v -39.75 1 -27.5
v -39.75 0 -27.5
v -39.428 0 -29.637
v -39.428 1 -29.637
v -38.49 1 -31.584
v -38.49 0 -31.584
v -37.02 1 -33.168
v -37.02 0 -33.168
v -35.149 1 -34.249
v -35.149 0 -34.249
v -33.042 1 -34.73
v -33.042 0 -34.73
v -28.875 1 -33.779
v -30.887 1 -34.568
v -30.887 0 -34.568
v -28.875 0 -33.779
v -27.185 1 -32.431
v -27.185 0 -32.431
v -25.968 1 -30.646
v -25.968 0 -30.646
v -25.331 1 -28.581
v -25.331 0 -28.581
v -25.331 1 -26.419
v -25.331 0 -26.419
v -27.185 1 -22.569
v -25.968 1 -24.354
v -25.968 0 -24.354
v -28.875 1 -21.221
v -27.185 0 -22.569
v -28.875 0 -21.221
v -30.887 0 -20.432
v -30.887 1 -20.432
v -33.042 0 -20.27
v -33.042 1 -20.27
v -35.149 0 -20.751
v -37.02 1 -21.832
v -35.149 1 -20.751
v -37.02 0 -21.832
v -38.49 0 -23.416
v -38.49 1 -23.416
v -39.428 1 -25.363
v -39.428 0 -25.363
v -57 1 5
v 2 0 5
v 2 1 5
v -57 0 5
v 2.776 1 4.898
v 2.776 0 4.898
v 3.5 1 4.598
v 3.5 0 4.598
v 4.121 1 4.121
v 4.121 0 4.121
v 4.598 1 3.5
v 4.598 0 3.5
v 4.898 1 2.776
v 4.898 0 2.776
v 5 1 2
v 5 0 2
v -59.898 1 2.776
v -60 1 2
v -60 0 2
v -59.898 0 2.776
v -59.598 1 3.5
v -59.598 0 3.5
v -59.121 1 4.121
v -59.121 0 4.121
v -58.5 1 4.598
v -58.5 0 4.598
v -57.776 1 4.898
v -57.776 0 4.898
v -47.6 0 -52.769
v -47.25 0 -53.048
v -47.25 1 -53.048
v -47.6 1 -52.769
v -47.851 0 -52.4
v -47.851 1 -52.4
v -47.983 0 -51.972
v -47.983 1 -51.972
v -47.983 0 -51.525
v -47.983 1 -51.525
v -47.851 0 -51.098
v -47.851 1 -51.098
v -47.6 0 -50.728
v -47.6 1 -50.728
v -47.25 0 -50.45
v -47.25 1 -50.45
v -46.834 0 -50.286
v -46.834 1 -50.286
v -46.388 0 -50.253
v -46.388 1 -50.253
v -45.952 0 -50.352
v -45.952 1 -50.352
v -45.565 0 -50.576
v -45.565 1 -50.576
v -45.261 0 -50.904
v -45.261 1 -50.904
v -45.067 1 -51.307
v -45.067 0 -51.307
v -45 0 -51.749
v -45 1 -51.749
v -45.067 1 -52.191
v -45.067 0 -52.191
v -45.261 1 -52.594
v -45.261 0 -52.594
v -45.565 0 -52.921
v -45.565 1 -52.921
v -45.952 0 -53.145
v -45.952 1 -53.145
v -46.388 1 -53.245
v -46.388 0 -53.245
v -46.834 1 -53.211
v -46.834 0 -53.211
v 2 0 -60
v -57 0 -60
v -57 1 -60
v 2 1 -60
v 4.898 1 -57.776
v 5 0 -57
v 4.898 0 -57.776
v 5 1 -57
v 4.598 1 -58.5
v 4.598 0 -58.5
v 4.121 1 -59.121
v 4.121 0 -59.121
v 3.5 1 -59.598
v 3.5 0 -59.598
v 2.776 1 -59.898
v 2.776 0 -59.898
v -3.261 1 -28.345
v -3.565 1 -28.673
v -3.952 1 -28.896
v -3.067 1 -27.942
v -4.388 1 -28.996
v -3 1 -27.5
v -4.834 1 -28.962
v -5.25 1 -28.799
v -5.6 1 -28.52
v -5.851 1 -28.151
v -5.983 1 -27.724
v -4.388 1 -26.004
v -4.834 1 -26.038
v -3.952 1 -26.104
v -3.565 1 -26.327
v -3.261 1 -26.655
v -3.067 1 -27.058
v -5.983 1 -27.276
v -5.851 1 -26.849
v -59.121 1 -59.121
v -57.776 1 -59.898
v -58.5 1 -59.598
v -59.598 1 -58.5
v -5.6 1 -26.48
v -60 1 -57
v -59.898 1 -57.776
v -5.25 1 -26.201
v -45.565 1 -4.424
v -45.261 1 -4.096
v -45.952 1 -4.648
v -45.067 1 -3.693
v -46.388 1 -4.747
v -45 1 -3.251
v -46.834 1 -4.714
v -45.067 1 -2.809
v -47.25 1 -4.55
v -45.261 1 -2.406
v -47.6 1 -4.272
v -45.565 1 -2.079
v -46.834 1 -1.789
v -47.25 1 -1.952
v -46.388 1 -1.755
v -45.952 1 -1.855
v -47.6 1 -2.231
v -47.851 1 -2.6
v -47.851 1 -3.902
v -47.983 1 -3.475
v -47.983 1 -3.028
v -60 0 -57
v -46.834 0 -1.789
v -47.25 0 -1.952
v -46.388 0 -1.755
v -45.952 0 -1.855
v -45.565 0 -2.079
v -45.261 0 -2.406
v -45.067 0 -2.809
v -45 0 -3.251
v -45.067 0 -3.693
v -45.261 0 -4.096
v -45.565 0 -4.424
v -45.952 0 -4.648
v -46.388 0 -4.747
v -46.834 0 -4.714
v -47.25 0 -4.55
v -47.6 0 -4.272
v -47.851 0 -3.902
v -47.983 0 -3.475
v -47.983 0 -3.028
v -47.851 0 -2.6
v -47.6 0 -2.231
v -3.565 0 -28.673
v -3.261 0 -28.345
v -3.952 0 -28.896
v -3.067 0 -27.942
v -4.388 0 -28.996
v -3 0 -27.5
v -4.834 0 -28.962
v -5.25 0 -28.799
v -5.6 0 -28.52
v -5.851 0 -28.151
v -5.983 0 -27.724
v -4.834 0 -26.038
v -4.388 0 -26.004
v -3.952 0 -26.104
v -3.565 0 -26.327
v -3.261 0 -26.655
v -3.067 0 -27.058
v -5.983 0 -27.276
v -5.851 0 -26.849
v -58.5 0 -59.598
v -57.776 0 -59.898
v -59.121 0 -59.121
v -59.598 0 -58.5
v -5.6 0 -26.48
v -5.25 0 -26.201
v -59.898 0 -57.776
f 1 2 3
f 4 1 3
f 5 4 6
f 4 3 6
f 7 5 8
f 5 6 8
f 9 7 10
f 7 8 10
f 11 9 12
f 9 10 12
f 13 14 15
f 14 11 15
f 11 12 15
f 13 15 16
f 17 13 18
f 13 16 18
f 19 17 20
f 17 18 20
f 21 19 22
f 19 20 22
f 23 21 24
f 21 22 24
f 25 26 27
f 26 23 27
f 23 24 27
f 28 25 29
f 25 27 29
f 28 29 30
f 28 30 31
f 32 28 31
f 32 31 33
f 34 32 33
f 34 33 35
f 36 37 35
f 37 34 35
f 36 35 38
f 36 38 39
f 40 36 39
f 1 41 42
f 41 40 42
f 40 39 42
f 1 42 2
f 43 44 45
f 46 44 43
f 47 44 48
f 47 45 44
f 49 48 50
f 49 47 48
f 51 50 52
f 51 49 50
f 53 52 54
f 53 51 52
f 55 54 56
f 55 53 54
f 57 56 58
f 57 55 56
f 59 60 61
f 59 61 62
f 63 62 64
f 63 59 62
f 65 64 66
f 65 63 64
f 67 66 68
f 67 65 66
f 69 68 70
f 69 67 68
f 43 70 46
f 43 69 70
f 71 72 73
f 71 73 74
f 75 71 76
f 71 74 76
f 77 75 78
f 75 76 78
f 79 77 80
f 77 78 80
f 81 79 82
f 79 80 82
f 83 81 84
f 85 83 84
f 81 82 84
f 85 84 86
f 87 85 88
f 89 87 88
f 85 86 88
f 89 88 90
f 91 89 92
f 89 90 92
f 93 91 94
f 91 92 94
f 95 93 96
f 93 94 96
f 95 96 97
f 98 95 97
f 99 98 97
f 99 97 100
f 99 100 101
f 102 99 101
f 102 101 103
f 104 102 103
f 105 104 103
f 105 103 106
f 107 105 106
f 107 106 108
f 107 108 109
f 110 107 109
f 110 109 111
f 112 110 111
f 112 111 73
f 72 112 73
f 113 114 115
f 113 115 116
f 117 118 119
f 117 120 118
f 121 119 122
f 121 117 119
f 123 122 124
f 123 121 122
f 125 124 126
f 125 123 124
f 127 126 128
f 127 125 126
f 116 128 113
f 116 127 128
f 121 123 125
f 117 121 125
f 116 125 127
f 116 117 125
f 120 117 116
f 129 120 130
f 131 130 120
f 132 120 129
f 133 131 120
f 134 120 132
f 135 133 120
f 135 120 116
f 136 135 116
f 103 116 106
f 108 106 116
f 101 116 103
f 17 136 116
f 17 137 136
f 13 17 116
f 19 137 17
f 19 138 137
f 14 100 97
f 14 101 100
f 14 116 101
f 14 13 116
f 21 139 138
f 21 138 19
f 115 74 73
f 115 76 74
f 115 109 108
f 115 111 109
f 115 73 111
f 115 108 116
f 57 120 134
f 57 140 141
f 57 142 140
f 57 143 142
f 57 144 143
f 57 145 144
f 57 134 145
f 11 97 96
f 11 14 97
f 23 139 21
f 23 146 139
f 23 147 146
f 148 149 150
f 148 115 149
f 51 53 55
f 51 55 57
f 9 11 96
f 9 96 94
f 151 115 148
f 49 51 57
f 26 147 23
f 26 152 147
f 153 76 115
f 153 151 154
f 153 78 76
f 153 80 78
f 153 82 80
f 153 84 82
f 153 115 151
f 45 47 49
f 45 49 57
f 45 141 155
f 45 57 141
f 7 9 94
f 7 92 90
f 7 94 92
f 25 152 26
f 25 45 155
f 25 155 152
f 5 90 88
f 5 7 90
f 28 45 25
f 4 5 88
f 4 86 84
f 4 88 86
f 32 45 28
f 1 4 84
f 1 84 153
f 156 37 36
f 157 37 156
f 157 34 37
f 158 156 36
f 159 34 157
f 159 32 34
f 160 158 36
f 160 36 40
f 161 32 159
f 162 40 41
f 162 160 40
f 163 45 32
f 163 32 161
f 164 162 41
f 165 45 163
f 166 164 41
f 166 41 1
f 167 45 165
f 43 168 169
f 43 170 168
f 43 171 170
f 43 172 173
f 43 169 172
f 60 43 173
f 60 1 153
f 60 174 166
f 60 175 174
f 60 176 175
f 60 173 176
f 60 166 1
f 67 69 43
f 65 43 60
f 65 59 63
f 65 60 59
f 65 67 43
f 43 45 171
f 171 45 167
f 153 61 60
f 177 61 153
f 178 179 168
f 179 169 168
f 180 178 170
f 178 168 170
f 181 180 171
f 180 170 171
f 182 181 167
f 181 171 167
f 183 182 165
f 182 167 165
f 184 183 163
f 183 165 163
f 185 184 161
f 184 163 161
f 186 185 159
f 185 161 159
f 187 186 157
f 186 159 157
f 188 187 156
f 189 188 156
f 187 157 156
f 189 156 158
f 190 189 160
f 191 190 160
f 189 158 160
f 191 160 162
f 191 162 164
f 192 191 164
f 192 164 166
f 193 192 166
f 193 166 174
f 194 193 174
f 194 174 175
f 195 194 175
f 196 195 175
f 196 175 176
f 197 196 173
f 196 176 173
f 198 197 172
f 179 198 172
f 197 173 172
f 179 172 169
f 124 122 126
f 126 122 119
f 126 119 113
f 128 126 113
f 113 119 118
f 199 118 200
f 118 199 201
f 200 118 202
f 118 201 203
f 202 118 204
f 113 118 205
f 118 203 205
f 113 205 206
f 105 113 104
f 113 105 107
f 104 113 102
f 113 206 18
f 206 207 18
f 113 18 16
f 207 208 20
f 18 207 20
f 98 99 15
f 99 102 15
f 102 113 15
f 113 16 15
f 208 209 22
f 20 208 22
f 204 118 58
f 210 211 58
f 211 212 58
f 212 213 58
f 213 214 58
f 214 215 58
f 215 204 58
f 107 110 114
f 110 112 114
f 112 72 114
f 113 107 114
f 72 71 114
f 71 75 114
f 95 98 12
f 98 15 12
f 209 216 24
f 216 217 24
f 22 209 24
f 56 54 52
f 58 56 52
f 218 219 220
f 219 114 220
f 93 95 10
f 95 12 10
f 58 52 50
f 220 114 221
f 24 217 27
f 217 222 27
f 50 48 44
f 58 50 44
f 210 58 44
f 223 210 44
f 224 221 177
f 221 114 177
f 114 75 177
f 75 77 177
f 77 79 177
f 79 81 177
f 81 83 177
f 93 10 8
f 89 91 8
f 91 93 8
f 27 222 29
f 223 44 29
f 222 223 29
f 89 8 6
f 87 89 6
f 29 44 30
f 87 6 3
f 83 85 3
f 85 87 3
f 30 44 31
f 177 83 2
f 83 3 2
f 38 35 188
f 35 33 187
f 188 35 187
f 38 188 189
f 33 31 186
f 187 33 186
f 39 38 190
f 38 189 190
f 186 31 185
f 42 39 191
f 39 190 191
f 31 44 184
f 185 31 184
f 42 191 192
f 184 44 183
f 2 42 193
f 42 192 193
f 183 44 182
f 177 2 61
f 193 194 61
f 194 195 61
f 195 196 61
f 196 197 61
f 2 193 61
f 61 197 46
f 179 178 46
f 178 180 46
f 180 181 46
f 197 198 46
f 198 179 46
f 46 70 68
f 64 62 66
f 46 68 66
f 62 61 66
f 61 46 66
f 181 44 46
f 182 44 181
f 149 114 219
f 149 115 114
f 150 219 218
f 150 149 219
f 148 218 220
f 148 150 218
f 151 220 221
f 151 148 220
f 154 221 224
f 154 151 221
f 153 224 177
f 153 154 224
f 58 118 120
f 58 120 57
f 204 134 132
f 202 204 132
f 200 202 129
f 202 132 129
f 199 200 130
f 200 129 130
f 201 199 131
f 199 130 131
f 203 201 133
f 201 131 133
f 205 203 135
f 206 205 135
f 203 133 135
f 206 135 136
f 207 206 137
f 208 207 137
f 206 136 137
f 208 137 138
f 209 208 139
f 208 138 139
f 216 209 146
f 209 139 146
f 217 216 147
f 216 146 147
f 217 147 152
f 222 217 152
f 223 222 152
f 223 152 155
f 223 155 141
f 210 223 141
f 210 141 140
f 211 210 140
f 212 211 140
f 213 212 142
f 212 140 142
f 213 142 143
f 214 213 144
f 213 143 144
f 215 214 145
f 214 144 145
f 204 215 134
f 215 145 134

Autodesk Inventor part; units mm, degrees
ref_plane "YZ Plane" through (0, 0, 0) normal (1, 0, 0) x (0, 1, 0)
ref_plane "XZ Plane" through (0, 0, 0) normal (0, 1, 0) x (-1, 0, 0)
ref_plane "XY Plane" through (0, 0, 0) normal (0, 0, 1) x (1, 0, 0)
sketch "Esboço1" plane through (0, 0, 0) normal (0, 1, 0) x (-1, 0, 0)
  line L0 (0, 5) -> (-5, 5)
  line L1 (60, -55) -> (60, -60)
  line L2 (60, -60) -> (-5, -60)
  line L3 (-5, -60) -> (-5, 5)
  line L4 (-5, 5) -> (60, 5)
  line L5 (60, 5) -> (60, -60)
  line L6 (27.5, 5) -> (32.5, 5)
  circle A0 centre (32.5, -27.5) radius 7.25
  dimension "d11" = 5
  dimension "d13" = 5
  dimension "d16" = 5
  dimension "d17" = 14.5
extrude "Extrusão4" add sketch "Esboço1" along normal blind 1
sketch "Esboço2" plane through (0, 1, 0) normal (0, 1, 0) x (1, 0, 0)
  circle A0 centre (-32.5, 27.5) radius 7.25 projected
  circle A1 centre (-4.5, 27.5) radius 1.5
  point P0 (0, 0)
  dimension "d21" = 3
extrude "Extrusão5" cut sketch "Esboço2" against normal blind 10 contours A1
pattern_circular "Padrão circular1" count 3 over 360 about axis through (-32.5, 0, -27.5) along (0, 1, 0) of "Extrusão5"
sketch "Esboço3" plane through (-60, 0, 5) normal (0, 0, 1) x (1, 0, 0)
  line L0 (65, 0) -> (0, 0) projected
  line L1 (65, 1) -> (0, 1)
  line L2 (0, 1) -> (0, 0)
  line L3 (0, 0) -> (65, 0)
  line L4 (65, 0) -> (65, 1)
  point P0 (60, 0)
sketch "Esboço4" plane through (5, 0, -60) normal (0, 0, -1) x (-1, 0, 0)
  line L0 (0, 1) -> (65, 1) projected
  line L1 (65, 1) -> (0, 1)
  line L2 (0, 1) -> (0, 0)
  line L3 (0, 0) -> (65, 0)
  line L4 (65, 0) -> (65, 1)
  point P0 (5, 0)
fillet "Arredondamento1" radius 3 4 edges at (5, 0.5, -60) (5, 0.5, 5) (-60, 0.5, -60) (-60, 0.5, 5)
properties part number "borracha isolamento respirador" material "Borracha"
